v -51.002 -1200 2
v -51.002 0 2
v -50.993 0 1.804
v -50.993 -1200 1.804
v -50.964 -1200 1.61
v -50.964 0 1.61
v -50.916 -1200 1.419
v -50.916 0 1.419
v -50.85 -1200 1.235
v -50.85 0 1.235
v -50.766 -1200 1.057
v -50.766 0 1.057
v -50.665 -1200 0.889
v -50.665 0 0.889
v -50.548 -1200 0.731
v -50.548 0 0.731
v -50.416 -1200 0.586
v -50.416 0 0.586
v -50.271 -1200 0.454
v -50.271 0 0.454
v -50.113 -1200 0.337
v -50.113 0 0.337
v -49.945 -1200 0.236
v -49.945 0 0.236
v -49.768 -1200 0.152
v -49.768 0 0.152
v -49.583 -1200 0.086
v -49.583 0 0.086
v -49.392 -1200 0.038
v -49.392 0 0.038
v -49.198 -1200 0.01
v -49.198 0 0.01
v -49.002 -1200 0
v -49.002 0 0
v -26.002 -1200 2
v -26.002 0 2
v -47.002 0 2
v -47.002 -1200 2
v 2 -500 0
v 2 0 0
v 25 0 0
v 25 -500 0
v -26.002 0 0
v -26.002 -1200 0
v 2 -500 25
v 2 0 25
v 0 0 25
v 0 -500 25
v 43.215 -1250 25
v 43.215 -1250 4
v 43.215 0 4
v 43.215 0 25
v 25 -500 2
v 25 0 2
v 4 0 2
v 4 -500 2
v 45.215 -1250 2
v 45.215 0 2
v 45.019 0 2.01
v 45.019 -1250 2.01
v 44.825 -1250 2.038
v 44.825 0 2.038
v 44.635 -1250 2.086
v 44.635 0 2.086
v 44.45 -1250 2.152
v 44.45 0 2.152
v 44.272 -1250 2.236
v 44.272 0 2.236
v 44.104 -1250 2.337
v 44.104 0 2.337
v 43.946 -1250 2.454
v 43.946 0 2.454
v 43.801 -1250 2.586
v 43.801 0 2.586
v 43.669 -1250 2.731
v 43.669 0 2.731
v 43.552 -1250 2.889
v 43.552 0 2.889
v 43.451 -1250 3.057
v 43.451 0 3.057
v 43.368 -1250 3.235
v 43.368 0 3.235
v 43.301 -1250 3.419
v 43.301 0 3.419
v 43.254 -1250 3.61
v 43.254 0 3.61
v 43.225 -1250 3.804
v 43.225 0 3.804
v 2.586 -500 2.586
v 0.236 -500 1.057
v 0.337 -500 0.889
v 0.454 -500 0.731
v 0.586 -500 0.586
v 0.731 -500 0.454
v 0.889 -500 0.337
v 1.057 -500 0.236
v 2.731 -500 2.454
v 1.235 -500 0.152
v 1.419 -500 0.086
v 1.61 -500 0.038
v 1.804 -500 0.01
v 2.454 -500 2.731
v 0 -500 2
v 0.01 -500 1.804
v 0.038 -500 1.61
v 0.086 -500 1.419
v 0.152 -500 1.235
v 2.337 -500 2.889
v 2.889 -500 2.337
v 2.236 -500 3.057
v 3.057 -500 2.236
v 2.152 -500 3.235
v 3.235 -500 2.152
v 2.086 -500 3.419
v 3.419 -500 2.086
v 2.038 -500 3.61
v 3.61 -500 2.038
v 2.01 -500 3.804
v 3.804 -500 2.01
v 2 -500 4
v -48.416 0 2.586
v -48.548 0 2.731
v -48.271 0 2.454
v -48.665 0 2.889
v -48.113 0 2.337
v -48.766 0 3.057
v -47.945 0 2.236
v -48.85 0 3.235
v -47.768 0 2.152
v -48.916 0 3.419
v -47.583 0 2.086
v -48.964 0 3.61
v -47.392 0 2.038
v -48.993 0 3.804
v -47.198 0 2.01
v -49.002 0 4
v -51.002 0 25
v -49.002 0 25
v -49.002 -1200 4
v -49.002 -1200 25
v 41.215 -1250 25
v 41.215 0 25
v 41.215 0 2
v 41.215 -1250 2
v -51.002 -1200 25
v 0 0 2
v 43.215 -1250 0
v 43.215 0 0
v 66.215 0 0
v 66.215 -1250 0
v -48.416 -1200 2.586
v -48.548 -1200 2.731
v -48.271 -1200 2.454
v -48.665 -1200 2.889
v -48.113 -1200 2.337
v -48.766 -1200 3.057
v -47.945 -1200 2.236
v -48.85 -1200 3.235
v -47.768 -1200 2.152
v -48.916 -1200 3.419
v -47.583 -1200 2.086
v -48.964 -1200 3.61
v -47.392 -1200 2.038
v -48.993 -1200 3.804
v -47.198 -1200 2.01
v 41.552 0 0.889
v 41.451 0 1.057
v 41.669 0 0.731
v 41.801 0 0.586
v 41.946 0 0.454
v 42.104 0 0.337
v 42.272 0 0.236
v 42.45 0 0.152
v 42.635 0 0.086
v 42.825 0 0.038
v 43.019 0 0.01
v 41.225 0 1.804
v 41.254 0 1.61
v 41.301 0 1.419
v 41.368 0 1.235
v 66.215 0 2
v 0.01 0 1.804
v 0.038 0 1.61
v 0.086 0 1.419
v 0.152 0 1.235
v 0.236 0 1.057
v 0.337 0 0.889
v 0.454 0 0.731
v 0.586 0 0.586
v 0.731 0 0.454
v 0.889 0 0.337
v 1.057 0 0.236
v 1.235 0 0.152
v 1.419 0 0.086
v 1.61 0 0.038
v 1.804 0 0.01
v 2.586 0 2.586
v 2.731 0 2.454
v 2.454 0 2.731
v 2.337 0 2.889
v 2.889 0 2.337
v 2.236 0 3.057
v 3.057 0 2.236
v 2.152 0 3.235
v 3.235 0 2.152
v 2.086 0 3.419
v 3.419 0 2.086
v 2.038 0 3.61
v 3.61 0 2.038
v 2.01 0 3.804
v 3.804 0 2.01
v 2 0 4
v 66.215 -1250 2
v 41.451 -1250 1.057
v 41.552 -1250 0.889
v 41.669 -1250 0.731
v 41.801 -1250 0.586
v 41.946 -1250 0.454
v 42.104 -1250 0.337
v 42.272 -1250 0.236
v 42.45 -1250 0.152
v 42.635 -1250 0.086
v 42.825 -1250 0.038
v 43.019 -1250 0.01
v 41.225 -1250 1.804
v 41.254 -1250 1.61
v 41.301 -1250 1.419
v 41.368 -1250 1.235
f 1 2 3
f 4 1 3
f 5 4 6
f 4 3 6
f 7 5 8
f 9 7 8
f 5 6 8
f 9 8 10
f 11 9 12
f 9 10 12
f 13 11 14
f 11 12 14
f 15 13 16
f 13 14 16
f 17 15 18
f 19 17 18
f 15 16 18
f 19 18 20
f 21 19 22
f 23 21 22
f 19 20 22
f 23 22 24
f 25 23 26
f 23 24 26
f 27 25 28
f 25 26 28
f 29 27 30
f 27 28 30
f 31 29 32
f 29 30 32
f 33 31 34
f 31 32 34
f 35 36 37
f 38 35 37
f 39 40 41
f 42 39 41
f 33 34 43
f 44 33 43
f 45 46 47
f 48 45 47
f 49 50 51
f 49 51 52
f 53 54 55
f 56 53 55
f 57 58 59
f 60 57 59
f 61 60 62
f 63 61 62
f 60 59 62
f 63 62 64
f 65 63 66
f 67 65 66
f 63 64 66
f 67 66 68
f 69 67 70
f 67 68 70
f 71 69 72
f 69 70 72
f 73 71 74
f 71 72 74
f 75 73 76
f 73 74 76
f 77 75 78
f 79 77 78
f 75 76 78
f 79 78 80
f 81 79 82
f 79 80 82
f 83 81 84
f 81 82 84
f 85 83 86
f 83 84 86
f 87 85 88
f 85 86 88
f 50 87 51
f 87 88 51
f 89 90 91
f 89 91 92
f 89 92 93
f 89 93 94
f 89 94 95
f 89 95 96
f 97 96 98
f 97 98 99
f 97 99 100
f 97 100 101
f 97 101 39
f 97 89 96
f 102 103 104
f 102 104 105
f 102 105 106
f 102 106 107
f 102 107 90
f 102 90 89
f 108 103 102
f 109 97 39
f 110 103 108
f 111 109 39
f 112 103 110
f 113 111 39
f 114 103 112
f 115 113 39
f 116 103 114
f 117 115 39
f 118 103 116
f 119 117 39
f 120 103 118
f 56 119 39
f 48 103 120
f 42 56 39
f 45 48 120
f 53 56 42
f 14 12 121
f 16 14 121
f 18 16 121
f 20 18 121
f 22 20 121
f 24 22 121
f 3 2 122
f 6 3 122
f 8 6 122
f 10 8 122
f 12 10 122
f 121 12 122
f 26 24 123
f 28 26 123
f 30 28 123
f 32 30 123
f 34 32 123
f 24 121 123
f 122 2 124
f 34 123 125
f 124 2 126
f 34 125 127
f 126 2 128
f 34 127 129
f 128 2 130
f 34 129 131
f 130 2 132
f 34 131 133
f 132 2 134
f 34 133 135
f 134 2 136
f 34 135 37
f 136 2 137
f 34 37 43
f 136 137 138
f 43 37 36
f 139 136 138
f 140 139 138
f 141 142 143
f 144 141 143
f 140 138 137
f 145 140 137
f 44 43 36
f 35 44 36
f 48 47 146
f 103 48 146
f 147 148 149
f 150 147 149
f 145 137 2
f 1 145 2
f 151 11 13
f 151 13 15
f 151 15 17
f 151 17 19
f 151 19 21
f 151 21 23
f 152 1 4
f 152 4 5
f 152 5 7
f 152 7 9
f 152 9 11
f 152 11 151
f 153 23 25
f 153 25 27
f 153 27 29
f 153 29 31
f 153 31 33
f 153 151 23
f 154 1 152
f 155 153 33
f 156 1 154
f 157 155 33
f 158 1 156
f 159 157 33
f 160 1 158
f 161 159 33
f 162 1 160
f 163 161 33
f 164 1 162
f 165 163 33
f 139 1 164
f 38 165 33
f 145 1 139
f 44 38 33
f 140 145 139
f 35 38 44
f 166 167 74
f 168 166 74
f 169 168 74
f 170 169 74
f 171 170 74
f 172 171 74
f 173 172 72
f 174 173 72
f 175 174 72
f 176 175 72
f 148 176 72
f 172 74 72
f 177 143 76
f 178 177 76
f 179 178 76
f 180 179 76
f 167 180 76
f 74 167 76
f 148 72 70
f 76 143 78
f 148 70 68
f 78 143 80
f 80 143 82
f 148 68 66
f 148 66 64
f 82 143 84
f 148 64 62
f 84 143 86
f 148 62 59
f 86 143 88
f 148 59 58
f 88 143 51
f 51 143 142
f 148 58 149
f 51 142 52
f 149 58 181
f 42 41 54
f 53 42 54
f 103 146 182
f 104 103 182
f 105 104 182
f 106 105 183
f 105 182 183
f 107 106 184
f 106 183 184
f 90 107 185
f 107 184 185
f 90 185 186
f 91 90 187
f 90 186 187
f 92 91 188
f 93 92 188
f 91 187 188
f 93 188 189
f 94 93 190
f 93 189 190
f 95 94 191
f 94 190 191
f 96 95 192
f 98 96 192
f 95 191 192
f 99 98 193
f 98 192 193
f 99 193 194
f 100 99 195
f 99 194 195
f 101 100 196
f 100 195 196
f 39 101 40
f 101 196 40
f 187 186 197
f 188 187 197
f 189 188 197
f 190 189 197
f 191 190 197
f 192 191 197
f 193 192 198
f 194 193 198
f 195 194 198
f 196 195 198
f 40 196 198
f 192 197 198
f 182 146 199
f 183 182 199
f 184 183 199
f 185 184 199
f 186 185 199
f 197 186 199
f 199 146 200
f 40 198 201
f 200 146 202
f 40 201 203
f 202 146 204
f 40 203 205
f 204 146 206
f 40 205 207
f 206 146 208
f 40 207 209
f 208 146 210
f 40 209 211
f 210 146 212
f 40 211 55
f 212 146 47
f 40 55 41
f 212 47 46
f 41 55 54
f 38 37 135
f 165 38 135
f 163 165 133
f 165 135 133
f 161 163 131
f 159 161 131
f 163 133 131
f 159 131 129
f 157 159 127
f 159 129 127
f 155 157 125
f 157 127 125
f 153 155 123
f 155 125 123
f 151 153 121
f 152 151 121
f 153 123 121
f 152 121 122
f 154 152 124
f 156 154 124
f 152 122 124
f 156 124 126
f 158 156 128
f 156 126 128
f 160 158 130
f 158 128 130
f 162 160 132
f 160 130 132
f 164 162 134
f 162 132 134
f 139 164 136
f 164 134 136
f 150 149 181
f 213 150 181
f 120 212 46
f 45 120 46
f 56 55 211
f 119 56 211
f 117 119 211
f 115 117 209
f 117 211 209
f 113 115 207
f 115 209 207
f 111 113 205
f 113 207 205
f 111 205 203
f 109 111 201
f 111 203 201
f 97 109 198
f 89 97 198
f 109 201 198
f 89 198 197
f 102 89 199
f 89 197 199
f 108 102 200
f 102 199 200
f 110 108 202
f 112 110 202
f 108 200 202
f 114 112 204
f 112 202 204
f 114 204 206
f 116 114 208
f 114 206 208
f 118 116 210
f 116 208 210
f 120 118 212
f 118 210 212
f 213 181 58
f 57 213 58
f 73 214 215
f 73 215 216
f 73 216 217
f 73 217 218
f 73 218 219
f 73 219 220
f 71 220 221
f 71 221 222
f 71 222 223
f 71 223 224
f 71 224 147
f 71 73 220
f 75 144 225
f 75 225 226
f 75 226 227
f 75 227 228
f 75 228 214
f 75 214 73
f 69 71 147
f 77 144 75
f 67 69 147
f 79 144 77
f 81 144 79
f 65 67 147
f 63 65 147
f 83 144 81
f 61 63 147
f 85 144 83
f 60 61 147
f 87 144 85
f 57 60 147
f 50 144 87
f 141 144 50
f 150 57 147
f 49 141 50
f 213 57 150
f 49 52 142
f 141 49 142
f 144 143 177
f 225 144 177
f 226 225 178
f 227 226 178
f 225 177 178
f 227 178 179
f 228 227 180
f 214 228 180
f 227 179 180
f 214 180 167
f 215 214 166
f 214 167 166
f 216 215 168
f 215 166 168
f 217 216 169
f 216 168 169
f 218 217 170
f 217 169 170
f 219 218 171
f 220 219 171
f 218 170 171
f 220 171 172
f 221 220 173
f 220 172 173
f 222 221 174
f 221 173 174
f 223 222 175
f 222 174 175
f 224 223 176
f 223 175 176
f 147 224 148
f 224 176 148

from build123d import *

# Parameters (mm, degrees)
F1_DEPTH = 500
F3_DEPTH = 1250
F5_DEPTH = 1200


with BuildPart() as f1:
    # F0 (on Front) → F1 (new body)
    with BuildSketch(Plane.XZ):
        with BuildLine():
            Line((0, 25), (0, 2))
            ThreePointArc((0, 2), (0.585786, 0.585786), (2, 0))
            Line((2, 0), (25, 0))
            Line((25, 0), (25, 2))
            Line((25, 2), (4, 2))
            ThreePointArc((4, 2), (2.585786, 2.585786), (2, 4))
            Line((2, 4), (2, 25))
            Line((2, 25), (0, 25))
        make_face()
    extrude(amount=F1_DEPTH)


with BuildPart() as f3:
    # F2 (on Front) → F3 (new body)
    with BuildSketch(Plane.XZ):
        with BuildLine():
            Line((41.215283, 25), (41.215283, 2))
            ThreePointArc((41.215283, 2), (41.801069, 0.585786), (43.215283, 0))
            Line((43.215283, 0), (66.215283, 0))
            Line((66.215283, 0), (66.215283, 2))
            Line((66.215283, 2), (45.215283, 2))
            ThreePointArc((45.215283, 2), (43.801069, 2.585786), (43.215283, 4))
            Line((43.215283, 4), (43.215283, 25))
            Line((43.215283, 25), (41.215283, 25))
        make_face()
    extrude(amount=F3_DEPTH)


with BuildPart() as f5:
    # F4 (on Front) → F5 (new body)
    with BuildSketch(Plane.XZ):
        with BuildLine():
            Line((-51.002225, 25), (-51.002225, 2))
            ThreePointArc((-51.002225, 2), (-50.416438, 0.585786), (-49.002225, 0))
            Line((-49.002225, 0), (-26.002225, 0))
            Line((-26.002225, 0), (-26.002225, 2))
            Line((-26.002225, 2), (-47.002225, 2))
            ThreePointArc((-47.002225, 2), (-48.416438, 2.585786), (-49.002225, 4))
            Line((-49.002225, 4), (-49.002225, 25))
            Line((-49.002225, 25), (-51.002225, 25))
        make_face()
    extrude(amount=F5_DEPTH)


solid = Compound([f1.part, f3.part, f5.part])
